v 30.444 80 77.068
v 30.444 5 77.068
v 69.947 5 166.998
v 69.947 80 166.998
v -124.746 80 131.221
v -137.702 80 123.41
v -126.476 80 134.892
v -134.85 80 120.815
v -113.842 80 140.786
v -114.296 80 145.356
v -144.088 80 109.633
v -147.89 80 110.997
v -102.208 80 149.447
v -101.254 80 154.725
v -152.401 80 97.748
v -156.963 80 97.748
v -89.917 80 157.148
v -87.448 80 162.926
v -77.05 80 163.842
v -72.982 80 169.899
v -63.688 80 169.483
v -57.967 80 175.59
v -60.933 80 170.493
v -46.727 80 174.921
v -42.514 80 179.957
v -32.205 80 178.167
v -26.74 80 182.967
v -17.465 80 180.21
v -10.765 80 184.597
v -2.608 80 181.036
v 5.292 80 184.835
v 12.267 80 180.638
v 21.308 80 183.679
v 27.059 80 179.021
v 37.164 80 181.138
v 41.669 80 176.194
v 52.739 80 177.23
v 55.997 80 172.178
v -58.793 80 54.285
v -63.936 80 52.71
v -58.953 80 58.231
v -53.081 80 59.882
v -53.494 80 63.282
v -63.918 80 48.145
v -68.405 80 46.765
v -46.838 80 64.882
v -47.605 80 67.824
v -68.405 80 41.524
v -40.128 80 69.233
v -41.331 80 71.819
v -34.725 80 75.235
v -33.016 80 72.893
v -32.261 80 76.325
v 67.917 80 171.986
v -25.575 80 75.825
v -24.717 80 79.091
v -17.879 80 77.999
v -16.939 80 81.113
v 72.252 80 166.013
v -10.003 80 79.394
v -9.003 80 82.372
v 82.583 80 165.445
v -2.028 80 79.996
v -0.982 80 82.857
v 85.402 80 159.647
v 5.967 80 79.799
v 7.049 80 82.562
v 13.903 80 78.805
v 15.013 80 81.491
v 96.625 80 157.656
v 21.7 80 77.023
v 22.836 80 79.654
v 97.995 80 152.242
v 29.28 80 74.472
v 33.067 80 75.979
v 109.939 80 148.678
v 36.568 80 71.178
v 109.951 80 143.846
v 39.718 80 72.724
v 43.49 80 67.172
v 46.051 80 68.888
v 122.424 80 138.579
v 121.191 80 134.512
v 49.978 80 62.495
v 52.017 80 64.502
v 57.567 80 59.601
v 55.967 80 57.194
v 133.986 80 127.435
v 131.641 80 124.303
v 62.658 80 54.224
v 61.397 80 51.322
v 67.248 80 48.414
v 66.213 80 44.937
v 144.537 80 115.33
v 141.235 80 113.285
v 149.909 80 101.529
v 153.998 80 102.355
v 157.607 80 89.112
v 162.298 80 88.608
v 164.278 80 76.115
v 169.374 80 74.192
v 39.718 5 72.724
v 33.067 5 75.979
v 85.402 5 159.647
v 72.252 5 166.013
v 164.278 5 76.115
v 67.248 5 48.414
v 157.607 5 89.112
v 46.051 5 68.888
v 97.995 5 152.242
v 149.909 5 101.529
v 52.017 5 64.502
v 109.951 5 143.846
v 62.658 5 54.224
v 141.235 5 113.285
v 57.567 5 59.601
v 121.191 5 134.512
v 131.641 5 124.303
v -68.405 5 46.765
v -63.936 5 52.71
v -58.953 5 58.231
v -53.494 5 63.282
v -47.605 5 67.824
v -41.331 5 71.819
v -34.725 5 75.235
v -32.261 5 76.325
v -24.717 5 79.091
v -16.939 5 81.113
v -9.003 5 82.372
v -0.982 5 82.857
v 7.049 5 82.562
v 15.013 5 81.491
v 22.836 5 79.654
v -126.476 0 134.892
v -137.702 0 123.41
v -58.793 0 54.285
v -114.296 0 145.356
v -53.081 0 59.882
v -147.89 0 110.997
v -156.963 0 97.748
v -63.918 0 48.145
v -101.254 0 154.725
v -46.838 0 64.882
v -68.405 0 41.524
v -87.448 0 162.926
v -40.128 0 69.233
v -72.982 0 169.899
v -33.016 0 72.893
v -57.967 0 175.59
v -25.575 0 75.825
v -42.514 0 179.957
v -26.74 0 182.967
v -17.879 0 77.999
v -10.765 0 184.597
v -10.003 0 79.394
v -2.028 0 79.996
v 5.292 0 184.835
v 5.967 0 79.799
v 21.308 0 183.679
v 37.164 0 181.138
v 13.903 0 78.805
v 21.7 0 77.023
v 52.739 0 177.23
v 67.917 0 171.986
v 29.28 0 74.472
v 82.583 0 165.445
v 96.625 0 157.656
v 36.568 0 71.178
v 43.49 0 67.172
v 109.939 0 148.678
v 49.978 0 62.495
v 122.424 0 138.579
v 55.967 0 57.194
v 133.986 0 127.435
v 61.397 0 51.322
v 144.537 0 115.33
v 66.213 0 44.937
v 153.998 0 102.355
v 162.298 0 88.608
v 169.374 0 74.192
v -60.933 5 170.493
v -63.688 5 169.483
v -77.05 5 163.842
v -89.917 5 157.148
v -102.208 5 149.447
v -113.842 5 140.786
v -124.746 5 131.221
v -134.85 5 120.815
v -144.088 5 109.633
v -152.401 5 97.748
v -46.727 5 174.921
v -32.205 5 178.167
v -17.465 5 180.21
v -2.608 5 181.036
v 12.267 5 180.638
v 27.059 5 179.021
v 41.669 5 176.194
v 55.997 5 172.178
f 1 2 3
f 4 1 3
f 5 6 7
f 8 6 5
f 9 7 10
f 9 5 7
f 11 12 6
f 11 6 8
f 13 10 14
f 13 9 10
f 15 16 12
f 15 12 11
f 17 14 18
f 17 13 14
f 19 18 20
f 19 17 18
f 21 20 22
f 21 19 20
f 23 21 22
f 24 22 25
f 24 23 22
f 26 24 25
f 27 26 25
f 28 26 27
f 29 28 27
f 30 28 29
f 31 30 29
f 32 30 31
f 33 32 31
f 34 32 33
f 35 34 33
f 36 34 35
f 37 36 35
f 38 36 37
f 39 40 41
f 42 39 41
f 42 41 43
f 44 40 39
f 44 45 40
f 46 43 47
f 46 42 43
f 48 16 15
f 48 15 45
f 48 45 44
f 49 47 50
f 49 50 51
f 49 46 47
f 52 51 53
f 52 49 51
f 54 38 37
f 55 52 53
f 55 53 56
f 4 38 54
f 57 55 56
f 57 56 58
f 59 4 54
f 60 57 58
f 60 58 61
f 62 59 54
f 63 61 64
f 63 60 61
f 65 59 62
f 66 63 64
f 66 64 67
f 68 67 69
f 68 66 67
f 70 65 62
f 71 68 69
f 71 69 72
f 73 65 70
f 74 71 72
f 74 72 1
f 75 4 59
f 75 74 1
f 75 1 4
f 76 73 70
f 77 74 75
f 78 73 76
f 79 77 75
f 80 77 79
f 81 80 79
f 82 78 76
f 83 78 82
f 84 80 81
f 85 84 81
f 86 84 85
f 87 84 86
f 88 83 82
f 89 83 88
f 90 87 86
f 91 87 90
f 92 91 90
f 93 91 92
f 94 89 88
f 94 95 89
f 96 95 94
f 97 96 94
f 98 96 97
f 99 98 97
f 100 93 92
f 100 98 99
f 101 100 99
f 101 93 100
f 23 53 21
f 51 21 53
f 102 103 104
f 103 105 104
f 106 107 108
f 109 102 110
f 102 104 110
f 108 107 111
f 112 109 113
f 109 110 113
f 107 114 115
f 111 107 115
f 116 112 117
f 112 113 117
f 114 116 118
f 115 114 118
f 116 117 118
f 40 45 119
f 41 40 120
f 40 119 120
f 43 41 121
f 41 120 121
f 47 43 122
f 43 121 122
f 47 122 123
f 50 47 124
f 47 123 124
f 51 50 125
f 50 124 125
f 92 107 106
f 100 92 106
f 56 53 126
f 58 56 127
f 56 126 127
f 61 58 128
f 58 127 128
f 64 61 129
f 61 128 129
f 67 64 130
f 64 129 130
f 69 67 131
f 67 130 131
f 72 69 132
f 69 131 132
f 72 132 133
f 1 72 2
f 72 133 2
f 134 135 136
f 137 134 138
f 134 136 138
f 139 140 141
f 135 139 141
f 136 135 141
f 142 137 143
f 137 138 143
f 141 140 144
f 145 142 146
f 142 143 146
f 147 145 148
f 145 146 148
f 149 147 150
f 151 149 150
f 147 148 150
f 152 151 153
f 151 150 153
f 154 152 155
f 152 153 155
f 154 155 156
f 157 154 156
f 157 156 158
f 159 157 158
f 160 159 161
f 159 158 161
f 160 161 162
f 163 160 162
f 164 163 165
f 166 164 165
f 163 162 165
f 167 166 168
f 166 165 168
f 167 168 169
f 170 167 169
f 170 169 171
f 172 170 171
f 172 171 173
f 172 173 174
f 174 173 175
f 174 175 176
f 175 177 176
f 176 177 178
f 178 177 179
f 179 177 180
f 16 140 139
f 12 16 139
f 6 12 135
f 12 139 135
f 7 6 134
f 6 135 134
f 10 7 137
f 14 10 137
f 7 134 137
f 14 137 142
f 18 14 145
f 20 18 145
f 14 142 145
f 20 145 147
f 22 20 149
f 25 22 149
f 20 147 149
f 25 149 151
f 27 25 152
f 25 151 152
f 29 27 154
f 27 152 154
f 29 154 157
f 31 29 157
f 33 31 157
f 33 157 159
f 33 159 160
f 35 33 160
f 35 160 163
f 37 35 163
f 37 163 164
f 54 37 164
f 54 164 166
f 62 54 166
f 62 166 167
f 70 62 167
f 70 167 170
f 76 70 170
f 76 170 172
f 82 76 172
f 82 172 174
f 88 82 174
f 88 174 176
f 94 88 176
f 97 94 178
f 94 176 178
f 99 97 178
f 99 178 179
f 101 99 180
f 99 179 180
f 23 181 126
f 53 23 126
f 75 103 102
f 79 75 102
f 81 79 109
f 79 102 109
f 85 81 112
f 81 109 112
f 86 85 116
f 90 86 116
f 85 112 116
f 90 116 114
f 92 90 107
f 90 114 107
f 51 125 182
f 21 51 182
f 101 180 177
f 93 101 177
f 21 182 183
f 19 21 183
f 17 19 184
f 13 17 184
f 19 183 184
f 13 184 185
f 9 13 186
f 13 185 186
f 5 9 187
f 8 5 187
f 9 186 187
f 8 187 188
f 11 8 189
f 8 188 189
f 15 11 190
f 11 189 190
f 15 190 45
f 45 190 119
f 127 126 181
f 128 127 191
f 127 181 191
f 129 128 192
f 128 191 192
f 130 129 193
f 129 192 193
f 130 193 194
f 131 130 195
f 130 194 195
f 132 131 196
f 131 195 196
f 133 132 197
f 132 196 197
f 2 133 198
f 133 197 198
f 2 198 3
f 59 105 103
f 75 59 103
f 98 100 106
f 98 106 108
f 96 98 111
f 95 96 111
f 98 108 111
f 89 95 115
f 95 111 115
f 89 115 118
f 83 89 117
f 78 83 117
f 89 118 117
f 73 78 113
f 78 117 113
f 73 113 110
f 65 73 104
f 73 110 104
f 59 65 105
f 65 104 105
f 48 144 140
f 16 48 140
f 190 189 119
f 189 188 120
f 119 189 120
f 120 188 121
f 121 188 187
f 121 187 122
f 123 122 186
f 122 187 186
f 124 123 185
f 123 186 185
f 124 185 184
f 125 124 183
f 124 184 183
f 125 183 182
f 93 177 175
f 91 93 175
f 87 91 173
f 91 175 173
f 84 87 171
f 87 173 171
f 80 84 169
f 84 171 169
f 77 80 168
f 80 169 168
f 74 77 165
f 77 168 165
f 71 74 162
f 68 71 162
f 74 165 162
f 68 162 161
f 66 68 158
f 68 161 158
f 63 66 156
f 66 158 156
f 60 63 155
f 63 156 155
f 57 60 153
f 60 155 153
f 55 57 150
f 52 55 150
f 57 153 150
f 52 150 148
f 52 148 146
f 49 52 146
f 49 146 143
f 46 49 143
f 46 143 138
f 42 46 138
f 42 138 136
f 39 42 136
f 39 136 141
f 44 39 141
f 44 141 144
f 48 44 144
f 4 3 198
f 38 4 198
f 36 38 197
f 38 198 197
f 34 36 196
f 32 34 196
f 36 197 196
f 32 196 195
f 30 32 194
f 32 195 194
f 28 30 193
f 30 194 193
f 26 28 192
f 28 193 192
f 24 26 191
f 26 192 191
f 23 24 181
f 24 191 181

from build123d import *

# Parameters (mm, degrees)
BOSS_EXTRUDE1_DEPTH = 80
BOSS_EXTRUDE2_DEPTH = 5


with BuildPart() as part:
    # Sketch1 → Boss-Extrude1 (new body)
    with BuildSketch(Plane(origin=(0, 0, 0), x_dir=(1, 0, 0), z_dir=(0, 1, 0))):
        with BuildLine():
            Line((-68.405029852, -41.523820038), (-156.962867052, -97.747709945))
            ThreePointArc((-156.962867052, -97.747709945), (13.312357604, -184.430847657), (169.373640638, -74.192494834))
            Line((169.373640638, -74.192494834), (66.212991348, -44.936794682))
            ThreePointArc((66.212991348, -44.936794682), (-2.028141312, -79.996014791), (-68.405029852, -41.523820038))
        make_face()
        with BuildLine():
            Line((-34.725471354, -75.235438156), (-63.687790654, -169.483352526))
            ThreePointArc((-63.687790654, -169.483352526), (-113.842495993, -140.785750585), (-152.401202956, -97.747709945))
            Line((-152.401202956, -97.747709945), (-68.405029852, -46.765173005))
            ThreePointArc((-68.405029852, -46.765173005), (-53.494056391, -63.282030989), (-34.725471354, -75.235438156))
        make_face(mode=Mode.SUBTRACT)
        with BuildLine():
            Line((30.443645827, -77.067593345), (69.946567205, -166.997662253))
            ThreePointArc((69.946567205, -166.997662253), (4.833688489, -180.989991208), (-60.933223363, -170.493060716))
            Line((-60.933223363, -170.493060716), (-32.261228696, -76.324587377))
            ThreePointArc((-32.261228696, -76.324587377), (-0.981792411, -82.856898318), (30.443645827, -77.067593345))
        make_face(mode=Mode.SUBTRACT)
        with BuildLine():
            Line((67.248014437, -48.414192851), (164.278182262, -76.114520917))
            ThreePointArc((164.278182262, -76.114520917), (126.518982101, -129.513275883), (72.251766234, -166.013323977))
            Line((72.251766234, -166.013323977), (33.067262274, -75.978850221))
            ThreePointArc((33.067262274, -75.978850221), (52.01674028, -64.50184684), (67.248014437, -48.414192851))
        make_face(mode=Mode.SUBTRACT)
    extrude(amount=BOSS_EXTRUDE1_DEPTH)

    # Sketch4 → Boss-Extrude2 (add)
    with BuildSketch(Plane.XZ):
        with BuildLine():
            Line((-156.962867052, 97.747709945), (-68.405029852, 41.523820038))
            ThreePointArc((-68.405029852, 41.523820038), (-2.028141312, 79.996014791), (66.212991348, 44.936794682))
            Line((66.212991348, 44.936794682), (169.373640638, 74.192494834))
            ThreePointArc((169.373640638, 74.192494834), (13.312357604, 184.430847657), (-156.962867052, 97.747709945))
        make_face()
    extrude(amount=-BOSS_EXTRUDE2_DEPTH)


solid = part.part
